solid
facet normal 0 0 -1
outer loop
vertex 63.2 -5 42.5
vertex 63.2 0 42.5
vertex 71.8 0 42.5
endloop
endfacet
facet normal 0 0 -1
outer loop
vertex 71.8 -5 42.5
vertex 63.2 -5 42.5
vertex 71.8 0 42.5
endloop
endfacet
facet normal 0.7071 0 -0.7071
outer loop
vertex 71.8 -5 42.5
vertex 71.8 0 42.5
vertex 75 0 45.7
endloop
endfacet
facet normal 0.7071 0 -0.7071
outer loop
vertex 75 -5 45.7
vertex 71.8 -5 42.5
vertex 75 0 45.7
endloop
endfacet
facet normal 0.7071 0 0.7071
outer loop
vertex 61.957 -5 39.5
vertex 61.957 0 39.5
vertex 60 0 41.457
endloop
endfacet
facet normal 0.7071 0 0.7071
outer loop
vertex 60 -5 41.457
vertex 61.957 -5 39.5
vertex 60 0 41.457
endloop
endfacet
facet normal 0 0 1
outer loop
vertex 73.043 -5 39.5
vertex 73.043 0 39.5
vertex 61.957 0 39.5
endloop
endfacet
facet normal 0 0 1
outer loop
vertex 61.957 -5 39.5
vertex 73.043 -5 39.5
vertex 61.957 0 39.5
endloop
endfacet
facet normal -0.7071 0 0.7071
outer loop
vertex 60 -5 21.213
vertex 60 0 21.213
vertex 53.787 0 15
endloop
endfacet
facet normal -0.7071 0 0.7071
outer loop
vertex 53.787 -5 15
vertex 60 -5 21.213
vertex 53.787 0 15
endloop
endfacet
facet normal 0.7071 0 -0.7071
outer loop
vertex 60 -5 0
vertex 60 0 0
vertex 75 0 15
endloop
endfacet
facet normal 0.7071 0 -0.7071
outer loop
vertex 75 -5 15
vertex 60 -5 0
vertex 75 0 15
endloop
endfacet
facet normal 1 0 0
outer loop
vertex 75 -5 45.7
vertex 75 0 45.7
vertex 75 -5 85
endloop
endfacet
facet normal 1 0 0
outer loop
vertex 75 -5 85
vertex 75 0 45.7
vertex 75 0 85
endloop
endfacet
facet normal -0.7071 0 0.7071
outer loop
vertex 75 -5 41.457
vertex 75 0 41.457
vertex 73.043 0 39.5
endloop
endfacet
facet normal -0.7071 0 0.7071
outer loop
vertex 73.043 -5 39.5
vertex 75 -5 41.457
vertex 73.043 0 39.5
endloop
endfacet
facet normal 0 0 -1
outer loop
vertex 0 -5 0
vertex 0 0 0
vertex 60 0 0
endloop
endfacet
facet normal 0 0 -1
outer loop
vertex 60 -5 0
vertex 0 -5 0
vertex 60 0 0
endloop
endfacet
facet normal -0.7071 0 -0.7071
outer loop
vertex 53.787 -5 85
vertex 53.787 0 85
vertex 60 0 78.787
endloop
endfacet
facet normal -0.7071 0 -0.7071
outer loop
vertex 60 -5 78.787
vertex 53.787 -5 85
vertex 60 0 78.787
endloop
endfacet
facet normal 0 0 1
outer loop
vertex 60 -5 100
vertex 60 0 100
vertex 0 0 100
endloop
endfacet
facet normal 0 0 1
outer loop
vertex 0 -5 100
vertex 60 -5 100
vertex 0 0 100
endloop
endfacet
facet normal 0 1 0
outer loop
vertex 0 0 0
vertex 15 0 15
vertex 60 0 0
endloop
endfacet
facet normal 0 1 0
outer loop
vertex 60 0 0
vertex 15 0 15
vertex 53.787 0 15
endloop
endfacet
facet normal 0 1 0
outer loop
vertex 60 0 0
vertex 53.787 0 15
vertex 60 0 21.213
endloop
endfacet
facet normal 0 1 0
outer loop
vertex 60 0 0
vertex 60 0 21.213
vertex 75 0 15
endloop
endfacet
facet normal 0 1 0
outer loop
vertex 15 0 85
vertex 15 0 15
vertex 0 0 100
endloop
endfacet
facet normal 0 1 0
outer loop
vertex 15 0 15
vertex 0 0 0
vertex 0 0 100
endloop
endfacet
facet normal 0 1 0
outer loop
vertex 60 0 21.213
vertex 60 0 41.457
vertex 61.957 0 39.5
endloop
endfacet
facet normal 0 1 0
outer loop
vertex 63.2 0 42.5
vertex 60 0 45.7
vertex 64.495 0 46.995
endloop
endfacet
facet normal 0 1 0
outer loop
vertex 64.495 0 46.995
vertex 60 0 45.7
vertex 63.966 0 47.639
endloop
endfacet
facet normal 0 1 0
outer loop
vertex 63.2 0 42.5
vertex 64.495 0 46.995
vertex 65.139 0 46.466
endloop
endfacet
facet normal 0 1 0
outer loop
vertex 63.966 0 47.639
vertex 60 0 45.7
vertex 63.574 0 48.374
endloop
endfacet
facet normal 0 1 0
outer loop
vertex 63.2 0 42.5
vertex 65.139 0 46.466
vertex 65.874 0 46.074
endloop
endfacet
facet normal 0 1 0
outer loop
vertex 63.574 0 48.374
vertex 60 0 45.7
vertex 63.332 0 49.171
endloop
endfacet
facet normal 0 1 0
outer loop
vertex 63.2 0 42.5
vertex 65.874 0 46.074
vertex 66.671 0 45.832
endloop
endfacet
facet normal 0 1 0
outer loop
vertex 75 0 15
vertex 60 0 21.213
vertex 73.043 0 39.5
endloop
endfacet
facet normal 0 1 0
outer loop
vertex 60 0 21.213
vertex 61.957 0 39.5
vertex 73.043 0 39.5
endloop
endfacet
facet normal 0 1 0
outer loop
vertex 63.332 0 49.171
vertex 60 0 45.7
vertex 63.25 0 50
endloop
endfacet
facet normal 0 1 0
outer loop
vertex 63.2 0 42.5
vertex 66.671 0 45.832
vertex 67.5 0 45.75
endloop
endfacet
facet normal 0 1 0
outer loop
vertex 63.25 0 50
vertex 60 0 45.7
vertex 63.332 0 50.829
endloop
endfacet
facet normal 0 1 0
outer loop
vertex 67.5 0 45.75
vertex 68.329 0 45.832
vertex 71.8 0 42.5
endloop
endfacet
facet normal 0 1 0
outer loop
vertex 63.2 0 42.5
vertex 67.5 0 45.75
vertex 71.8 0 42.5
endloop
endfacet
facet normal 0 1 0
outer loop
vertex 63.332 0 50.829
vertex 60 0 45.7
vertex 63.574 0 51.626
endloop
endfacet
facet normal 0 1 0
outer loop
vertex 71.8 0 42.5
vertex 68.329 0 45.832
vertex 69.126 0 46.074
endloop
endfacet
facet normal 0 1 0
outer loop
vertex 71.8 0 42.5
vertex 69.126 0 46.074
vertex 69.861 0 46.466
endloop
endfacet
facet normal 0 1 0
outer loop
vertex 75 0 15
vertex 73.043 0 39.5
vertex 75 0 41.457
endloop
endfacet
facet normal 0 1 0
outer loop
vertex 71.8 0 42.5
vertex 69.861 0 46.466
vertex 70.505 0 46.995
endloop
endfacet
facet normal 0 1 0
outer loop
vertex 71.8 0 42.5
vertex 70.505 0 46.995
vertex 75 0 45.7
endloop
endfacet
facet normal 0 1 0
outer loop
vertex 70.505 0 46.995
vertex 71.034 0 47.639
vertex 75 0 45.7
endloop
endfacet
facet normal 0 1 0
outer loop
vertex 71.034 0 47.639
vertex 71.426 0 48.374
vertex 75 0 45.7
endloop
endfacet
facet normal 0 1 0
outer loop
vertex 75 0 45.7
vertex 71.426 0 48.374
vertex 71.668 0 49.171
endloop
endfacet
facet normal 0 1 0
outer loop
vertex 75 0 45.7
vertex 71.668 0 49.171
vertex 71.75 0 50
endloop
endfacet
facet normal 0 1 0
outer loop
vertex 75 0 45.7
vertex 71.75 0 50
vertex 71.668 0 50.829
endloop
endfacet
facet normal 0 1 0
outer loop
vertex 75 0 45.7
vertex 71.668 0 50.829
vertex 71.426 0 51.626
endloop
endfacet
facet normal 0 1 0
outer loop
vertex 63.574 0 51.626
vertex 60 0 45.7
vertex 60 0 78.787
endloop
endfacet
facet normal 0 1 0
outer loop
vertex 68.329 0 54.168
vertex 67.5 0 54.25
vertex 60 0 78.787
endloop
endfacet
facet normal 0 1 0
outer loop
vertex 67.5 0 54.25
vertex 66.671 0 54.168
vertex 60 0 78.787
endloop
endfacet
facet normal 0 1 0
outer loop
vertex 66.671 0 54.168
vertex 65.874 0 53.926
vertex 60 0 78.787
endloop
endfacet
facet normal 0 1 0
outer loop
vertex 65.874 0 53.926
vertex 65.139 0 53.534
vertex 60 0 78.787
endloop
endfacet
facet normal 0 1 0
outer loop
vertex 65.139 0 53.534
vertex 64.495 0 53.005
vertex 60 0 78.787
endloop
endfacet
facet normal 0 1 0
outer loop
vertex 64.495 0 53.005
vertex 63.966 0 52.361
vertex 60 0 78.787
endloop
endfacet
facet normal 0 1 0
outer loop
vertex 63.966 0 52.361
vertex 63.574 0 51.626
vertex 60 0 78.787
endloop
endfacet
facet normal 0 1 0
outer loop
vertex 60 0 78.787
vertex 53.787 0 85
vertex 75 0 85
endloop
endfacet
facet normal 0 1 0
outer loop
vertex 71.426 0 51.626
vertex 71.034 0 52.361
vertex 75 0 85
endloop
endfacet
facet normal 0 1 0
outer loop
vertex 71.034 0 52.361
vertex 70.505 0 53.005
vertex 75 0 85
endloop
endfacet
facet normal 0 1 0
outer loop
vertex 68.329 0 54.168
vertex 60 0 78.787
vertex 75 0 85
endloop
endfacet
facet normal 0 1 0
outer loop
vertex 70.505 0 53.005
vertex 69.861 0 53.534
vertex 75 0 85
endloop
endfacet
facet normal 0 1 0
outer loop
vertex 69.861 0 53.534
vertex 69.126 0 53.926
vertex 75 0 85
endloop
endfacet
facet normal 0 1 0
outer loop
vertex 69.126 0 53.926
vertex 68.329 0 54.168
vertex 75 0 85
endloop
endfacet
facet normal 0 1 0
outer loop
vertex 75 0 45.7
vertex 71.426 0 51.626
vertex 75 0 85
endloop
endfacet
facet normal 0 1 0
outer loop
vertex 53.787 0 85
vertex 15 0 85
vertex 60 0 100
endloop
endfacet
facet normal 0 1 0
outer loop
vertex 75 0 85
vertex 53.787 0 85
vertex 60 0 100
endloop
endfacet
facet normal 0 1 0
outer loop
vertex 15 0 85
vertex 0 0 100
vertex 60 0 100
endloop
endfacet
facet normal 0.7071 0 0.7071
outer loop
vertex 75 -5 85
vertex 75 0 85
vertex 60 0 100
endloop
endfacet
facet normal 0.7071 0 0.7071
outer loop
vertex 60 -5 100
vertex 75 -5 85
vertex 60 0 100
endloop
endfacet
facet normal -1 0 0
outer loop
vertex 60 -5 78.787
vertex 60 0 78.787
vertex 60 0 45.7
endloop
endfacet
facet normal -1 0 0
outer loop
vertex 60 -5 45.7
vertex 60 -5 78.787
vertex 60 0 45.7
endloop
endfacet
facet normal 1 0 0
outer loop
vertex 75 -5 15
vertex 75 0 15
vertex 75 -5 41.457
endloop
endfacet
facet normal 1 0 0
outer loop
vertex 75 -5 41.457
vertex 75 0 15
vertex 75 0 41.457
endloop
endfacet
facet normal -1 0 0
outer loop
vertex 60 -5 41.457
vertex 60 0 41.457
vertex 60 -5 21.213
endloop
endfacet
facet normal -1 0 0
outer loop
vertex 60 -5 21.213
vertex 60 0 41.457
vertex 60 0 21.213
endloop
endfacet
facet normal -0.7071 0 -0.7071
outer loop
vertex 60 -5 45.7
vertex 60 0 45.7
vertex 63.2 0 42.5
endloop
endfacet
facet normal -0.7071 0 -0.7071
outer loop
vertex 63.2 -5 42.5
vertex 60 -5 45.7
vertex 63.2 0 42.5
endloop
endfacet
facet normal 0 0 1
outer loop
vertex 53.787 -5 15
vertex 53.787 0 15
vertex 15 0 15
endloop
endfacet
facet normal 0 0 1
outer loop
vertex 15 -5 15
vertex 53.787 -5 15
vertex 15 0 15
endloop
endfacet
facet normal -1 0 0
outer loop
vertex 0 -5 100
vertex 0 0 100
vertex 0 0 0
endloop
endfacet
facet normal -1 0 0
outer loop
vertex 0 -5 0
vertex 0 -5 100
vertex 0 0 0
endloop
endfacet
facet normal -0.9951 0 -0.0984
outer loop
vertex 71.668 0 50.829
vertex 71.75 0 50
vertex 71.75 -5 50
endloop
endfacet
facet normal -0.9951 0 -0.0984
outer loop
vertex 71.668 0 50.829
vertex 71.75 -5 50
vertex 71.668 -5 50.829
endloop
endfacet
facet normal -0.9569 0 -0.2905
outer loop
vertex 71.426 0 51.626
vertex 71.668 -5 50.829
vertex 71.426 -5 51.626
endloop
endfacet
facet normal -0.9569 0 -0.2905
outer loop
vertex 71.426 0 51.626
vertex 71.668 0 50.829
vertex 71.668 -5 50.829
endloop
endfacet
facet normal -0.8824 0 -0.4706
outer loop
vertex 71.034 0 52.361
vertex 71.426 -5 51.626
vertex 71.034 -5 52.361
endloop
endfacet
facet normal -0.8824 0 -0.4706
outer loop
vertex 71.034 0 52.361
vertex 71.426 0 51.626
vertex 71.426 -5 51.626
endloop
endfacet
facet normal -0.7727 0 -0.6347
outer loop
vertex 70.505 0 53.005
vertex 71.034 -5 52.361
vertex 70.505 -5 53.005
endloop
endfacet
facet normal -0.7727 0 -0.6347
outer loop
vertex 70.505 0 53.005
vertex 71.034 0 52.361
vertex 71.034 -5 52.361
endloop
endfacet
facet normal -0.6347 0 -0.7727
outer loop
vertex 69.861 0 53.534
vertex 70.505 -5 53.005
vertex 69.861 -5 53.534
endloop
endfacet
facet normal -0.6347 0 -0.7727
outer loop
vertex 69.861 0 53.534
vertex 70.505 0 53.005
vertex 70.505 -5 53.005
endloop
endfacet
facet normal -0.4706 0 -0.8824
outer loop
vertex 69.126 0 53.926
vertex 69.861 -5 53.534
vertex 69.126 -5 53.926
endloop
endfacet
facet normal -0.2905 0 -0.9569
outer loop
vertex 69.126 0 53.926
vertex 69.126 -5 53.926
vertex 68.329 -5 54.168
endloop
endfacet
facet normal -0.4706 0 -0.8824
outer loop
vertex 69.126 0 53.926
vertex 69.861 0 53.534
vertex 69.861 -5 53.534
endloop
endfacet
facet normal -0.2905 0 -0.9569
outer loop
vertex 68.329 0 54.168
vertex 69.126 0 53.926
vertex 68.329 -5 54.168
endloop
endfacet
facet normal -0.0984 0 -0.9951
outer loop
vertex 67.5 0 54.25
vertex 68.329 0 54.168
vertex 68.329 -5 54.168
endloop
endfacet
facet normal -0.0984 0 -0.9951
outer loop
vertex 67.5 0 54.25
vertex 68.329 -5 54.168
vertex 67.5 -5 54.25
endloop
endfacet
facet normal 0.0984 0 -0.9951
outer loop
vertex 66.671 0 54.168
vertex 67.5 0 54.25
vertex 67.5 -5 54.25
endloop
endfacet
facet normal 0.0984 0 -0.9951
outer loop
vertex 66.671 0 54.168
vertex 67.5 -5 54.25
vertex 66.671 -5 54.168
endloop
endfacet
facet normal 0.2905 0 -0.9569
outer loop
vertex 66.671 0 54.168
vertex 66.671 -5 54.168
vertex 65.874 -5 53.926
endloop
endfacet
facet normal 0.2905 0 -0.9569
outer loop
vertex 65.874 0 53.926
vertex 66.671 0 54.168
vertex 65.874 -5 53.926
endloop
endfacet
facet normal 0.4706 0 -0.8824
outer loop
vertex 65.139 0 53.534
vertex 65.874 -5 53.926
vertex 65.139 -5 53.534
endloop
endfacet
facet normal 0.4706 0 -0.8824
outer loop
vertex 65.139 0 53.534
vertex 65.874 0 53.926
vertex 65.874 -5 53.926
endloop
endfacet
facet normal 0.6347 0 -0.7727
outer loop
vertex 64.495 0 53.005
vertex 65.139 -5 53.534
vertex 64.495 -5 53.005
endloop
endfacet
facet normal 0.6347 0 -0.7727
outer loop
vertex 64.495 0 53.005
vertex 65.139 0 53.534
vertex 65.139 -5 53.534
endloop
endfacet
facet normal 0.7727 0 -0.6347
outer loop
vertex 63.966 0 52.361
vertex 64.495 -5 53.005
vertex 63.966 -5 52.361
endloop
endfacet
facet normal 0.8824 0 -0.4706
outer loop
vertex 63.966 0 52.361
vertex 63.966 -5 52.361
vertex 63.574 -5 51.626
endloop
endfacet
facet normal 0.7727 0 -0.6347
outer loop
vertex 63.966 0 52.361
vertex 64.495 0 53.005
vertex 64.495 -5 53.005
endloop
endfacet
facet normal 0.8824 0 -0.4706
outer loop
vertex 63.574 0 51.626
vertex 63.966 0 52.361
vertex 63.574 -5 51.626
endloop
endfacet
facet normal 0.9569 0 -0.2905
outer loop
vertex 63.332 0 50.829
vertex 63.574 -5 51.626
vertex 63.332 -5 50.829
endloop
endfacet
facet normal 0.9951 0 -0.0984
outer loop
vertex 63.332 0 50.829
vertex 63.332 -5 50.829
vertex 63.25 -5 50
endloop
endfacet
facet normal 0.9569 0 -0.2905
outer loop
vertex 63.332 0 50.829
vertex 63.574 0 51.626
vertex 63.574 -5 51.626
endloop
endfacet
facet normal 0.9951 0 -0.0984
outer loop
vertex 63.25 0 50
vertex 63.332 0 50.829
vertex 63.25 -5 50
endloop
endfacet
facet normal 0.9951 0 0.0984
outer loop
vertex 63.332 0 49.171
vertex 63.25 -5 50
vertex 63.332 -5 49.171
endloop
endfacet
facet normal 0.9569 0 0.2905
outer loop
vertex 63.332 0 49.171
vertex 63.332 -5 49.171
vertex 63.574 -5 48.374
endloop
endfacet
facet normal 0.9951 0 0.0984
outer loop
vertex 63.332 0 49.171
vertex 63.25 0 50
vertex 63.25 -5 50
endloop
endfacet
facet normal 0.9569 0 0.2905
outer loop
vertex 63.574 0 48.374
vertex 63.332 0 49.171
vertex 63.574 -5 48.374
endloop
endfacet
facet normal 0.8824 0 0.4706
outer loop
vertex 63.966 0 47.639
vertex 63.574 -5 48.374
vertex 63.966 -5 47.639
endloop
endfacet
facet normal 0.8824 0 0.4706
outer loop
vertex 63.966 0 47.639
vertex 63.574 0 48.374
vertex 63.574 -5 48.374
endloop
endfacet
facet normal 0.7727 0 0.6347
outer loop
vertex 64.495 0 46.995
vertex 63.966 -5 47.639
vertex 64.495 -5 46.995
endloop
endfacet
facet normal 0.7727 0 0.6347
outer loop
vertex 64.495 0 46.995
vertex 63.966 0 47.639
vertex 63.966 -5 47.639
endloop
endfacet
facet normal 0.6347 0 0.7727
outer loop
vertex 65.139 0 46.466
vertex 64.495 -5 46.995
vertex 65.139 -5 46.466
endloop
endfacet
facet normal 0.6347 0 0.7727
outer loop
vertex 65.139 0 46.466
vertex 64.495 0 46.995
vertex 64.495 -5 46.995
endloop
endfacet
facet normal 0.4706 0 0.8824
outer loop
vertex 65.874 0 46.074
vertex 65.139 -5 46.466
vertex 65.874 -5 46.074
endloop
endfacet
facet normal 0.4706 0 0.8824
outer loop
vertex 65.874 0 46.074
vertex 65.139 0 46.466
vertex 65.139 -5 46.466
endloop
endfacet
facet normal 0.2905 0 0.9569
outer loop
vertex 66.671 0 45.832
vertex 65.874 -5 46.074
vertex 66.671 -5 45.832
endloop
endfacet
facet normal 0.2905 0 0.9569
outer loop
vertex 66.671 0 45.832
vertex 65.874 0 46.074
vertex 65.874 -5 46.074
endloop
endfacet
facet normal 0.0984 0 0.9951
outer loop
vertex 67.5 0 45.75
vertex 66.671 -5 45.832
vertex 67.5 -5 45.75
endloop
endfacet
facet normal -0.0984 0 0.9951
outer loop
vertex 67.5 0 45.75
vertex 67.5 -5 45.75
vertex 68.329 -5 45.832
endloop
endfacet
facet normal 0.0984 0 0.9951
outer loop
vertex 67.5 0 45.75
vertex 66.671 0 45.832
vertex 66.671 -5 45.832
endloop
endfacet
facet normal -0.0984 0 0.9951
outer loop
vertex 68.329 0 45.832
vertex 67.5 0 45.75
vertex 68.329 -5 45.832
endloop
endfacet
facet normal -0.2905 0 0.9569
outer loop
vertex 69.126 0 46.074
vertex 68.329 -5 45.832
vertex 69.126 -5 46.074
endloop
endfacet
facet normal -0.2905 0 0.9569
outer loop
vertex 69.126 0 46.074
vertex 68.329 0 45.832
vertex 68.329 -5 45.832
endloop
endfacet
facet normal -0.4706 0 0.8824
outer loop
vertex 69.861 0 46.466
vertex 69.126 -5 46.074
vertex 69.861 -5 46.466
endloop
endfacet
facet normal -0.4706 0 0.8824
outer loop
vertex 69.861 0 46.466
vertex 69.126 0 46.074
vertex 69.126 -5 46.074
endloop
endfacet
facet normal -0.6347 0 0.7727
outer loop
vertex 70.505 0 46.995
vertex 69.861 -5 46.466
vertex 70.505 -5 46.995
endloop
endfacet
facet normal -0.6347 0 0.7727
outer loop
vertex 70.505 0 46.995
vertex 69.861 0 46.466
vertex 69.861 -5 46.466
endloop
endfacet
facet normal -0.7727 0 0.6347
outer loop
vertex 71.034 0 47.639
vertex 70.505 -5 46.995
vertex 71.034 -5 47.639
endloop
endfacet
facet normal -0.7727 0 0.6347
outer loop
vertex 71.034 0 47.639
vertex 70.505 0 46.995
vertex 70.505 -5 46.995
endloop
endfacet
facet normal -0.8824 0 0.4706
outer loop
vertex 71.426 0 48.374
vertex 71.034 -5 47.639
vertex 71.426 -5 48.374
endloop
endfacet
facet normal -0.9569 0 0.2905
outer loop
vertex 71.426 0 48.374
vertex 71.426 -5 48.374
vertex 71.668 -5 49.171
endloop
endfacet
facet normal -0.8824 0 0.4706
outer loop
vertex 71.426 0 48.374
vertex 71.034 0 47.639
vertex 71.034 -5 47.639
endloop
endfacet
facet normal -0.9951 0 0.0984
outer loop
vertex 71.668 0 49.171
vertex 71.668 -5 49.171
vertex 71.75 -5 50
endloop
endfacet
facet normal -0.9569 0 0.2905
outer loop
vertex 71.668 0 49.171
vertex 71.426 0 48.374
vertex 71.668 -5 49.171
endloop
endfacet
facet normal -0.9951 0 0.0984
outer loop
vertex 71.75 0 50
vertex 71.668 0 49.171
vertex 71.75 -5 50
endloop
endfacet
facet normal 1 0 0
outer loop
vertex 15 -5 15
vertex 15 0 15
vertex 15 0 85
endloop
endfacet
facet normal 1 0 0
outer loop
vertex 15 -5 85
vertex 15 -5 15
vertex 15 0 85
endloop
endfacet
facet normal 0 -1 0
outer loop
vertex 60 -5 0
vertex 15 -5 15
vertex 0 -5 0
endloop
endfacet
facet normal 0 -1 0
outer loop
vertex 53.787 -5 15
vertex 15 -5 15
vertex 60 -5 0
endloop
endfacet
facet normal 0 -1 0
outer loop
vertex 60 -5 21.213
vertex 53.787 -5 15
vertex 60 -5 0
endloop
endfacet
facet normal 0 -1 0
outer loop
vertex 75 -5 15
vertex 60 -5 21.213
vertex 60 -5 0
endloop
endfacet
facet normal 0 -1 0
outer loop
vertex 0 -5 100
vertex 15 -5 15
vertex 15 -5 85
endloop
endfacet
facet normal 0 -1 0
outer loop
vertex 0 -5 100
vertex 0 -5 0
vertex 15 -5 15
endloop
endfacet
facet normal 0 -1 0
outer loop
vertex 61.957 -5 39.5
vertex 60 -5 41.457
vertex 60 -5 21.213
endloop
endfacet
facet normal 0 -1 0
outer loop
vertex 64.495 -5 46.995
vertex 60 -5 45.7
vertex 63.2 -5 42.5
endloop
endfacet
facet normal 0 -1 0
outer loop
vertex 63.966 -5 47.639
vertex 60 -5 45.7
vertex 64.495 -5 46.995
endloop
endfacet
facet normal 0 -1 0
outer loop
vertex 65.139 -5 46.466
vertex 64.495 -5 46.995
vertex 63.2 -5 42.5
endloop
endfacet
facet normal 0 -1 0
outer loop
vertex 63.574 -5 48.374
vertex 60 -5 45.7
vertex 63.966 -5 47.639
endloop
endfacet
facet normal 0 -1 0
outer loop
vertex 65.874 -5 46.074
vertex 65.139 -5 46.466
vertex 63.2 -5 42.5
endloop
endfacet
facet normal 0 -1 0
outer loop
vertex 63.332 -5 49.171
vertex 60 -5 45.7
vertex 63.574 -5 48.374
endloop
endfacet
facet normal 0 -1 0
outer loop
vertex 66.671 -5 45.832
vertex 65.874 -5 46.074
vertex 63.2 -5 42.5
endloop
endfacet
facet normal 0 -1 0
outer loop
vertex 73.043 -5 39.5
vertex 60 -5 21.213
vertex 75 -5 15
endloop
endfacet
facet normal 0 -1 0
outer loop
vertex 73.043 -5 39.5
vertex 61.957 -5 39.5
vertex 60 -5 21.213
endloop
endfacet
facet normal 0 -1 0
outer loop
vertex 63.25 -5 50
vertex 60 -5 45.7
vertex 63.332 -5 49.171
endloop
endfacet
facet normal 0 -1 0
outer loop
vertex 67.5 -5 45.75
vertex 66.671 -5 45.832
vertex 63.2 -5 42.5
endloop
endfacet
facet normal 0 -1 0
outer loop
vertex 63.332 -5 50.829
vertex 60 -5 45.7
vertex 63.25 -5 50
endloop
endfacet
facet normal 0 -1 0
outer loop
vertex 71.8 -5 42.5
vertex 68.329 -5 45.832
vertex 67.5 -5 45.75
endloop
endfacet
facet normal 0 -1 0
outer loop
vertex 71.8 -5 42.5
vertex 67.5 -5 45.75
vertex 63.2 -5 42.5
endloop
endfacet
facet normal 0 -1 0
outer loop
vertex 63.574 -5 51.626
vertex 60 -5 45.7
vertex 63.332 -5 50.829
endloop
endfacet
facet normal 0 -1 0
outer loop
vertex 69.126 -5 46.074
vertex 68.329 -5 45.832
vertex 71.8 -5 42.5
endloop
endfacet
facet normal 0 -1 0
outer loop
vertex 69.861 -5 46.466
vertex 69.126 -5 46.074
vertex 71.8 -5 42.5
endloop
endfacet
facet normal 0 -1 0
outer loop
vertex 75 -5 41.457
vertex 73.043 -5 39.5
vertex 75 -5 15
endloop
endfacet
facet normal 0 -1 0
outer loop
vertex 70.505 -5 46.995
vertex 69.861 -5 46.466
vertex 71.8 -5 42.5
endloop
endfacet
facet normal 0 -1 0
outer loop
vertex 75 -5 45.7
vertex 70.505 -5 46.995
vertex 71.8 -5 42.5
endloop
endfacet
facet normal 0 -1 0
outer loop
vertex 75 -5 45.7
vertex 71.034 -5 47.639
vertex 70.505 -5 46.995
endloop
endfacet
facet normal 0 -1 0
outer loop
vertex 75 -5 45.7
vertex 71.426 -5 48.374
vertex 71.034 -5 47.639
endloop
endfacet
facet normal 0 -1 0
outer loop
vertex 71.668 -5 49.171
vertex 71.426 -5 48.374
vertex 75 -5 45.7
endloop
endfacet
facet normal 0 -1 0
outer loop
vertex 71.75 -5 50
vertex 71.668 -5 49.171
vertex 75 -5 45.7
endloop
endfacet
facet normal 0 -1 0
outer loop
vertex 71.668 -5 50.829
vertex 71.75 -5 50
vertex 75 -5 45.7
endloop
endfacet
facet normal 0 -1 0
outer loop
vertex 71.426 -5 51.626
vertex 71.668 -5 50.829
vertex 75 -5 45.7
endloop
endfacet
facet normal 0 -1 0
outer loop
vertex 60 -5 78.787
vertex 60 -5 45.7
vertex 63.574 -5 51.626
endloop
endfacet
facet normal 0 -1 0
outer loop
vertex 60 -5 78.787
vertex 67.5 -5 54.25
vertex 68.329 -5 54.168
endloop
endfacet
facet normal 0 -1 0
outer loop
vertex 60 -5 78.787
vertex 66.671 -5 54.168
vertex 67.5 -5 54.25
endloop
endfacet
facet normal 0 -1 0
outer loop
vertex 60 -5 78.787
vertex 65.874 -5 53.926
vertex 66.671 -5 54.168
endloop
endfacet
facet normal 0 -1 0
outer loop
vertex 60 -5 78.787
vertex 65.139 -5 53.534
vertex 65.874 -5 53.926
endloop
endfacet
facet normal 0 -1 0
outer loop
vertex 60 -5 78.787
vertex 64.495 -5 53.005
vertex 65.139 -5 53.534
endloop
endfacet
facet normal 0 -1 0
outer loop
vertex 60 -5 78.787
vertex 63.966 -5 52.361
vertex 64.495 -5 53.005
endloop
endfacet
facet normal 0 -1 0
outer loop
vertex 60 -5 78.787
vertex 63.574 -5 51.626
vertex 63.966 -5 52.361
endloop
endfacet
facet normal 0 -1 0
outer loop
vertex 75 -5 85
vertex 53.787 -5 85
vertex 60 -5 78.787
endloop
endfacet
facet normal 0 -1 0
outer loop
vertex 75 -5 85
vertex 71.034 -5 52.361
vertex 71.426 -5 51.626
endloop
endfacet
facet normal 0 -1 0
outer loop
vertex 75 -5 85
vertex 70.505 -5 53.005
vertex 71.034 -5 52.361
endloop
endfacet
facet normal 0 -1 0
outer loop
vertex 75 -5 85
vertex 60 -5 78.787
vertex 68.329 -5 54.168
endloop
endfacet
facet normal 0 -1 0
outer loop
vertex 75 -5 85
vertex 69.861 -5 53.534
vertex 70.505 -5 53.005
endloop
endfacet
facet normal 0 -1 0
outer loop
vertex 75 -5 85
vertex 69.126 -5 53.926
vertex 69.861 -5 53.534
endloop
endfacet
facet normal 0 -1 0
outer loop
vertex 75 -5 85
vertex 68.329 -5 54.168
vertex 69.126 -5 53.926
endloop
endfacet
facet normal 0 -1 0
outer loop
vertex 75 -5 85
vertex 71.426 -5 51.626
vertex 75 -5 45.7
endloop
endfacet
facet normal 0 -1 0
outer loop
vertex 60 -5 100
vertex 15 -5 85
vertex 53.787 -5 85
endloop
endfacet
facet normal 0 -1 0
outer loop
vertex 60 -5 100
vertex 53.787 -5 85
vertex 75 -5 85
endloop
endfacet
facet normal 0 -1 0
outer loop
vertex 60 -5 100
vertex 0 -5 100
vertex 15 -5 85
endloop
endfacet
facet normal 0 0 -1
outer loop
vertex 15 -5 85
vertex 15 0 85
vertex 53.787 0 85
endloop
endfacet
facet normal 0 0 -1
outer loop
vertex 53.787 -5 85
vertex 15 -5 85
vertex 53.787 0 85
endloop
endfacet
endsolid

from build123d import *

# Parameters (mm, degrees)
F0_R     = 4.25
F1_DEPTH = 5


with BuildPart() as f1:
    # F0 (on Front) → F1 (new body)
    with BuildSketch(Plane.XZ):
        Polygon((0, 100), (0, 0), (60, 0), (75, 15), (75, 41.457359), (73.042641, 39.5), (61.957359, 39.5), (60, 41.457359), (60, 21.213203), (53.786797, 15), (15, 15), (15, 85), (53.786797, 85), (60, 78.786797), (60, 45.7), (63.2, 42.5), (71.8, 42.5), (75, 45.7), (75, 85), (60, 100), align=None)
        with Locations((67.5, 50)):
            Circle(F0_R, mode=Mode.SUBTRACT)
    extrude(amount=F1_DEPTH)


solid = f1.part
